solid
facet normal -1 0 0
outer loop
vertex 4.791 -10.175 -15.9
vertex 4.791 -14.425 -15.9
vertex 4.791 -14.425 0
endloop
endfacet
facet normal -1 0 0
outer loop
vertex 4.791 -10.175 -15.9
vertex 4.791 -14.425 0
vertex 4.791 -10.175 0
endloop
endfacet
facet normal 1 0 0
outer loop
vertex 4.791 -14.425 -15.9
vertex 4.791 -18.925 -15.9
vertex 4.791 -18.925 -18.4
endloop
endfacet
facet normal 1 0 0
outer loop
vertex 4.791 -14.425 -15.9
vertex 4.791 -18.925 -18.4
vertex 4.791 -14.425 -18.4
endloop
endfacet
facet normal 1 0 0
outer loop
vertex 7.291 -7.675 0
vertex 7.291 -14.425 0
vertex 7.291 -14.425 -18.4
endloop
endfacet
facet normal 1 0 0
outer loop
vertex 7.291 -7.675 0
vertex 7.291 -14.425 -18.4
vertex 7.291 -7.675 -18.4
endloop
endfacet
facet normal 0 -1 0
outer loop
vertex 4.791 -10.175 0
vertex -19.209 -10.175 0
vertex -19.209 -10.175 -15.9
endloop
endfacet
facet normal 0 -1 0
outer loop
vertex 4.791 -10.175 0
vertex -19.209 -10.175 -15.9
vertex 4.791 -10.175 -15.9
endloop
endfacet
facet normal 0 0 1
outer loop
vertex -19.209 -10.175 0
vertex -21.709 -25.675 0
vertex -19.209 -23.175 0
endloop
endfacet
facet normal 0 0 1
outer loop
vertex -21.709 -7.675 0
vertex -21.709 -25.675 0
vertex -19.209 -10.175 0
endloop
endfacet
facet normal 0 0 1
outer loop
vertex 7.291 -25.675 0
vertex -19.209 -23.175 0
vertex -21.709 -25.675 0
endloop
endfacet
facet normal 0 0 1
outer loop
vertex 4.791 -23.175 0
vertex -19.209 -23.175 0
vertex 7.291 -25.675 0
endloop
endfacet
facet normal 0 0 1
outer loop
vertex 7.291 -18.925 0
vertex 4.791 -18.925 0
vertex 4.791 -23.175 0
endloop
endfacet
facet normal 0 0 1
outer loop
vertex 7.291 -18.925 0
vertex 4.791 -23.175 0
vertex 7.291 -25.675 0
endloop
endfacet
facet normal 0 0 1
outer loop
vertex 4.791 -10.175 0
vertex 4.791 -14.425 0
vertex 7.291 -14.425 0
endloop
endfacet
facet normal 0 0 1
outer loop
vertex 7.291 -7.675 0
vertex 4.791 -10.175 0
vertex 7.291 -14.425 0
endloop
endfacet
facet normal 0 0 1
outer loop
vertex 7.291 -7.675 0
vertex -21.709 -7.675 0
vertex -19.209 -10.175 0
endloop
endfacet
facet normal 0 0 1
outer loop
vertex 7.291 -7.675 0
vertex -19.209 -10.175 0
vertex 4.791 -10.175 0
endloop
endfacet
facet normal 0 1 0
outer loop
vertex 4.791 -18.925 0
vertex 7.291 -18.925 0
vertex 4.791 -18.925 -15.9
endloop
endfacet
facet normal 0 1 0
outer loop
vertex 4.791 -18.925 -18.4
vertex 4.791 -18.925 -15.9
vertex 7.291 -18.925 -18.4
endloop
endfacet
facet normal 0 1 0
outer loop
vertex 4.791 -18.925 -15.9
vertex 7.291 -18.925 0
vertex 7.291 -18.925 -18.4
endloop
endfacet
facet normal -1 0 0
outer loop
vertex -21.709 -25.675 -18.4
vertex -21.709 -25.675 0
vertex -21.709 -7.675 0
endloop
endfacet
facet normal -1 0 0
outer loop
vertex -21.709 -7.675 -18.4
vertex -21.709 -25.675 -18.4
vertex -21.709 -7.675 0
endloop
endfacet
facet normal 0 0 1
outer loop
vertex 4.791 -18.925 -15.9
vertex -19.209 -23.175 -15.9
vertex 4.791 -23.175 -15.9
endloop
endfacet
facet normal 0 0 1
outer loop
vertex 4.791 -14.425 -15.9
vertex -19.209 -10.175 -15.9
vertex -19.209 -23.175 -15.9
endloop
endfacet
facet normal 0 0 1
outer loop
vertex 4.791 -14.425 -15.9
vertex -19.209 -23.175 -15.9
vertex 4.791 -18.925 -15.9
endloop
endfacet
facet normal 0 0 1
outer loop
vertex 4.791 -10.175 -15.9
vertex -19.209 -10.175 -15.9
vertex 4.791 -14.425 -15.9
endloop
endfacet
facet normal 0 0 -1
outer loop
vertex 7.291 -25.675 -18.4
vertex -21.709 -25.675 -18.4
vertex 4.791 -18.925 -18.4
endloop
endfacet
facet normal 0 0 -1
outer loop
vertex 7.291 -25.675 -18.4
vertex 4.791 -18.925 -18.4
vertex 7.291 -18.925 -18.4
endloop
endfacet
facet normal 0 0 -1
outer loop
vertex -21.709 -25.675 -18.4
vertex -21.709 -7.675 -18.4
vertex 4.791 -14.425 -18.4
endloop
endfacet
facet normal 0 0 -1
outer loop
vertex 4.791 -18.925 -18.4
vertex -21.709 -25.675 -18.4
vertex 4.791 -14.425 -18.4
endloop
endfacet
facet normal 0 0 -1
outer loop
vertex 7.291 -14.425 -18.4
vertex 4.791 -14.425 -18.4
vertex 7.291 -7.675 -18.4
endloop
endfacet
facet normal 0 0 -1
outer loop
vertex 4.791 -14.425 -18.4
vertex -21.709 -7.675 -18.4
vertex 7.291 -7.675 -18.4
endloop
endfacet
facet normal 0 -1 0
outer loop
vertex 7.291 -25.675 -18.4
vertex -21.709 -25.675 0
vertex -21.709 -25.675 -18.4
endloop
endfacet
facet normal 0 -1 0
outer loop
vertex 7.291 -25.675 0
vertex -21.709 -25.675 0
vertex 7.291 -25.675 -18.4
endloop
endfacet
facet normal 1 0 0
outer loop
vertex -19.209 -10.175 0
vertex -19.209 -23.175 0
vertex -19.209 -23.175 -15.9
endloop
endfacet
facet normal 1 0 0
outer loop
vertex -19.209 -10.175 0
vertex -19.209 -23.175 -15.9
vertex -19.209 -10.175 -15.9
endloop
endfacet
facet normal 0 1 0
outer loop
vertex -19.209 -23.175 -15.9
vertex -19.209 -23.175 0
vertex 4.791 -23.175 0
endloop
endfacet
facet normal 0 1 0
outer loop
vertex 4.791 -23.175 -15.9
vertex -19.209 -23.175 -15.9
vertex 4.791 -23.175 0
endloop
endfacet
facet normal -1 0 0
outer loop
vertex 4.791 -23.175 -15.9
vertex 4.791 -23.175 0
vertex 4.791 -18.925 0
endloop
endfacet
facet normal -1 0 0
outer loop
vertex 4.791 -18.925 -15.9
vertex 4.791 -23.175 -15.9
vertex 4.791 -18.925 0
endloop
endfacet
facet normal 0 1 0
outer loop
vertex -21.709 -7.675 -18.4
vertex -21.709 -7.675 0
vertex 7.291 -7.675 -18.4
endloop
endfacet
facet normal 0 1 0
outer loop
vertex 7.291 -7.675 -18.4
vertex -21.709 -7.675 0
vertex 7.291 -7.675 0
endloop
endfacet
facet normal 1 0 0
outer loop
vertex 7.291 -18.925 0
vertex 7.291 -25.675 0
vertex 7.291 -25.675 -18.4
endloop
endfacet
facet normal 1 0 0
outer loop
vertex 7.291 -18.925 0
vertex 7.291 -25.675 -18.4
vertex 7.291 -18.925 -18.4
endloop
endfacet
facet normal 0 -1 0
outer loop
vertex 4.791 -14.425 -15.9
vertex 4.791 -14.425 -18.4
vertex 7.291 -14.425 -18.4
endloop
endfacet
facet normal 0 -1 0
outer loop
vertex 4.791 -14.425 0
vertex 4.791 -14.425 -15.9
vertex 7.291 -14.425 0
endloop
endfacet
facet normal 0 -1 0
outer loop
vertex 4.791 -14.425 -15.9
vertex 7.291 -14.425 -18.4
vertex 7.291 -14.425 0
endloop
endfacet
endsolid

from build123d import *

# Parameters (mm, degrees)
F0_W     = 24
F0_H     = 13
F1_DEPTH = 15.9
F2_T     = 2.5
F3_W     = 4.5
F3_H     = 2.5
F4_DEPTH = 2.5


with BuildPart() as f1:
    # F0 (on Top) → F1 (new body)
    with BuildSketch(Plane.XY):
        with Locations((-7.2094501108, -16.6747012585)):
            Rectangle(F0_W, F0_H)
    extrude(amount=-F1_DEPTH)

    # F2
    f2_openings = [f1.faces().sort_by_distance(p)[0] for p in [
        (-7.20945, -16.674701, 0),
    ]]
    offset(amount=F2_T, openings=f2_openings, kind=Kind.INTERSECTION)

    # F3 (on face) → F4 (cut)
    with BuildSketch(Plane.YZ.offset(7.2905498892)):
        Polygon((-14.4247012585, 0), (-16.6747012585, 0), (-18.9247012585, 0), (-18.9247012585, -15.9), (-14.4247012585, -15.9), align=None)
        with Locations((-16.6747012585, -17.15)):
            Rectangle(F3_W, F3_H)
    extrude(amount=-F4_DEPTH, mode=Mode.SUBTRACT)


solid = f1.part
